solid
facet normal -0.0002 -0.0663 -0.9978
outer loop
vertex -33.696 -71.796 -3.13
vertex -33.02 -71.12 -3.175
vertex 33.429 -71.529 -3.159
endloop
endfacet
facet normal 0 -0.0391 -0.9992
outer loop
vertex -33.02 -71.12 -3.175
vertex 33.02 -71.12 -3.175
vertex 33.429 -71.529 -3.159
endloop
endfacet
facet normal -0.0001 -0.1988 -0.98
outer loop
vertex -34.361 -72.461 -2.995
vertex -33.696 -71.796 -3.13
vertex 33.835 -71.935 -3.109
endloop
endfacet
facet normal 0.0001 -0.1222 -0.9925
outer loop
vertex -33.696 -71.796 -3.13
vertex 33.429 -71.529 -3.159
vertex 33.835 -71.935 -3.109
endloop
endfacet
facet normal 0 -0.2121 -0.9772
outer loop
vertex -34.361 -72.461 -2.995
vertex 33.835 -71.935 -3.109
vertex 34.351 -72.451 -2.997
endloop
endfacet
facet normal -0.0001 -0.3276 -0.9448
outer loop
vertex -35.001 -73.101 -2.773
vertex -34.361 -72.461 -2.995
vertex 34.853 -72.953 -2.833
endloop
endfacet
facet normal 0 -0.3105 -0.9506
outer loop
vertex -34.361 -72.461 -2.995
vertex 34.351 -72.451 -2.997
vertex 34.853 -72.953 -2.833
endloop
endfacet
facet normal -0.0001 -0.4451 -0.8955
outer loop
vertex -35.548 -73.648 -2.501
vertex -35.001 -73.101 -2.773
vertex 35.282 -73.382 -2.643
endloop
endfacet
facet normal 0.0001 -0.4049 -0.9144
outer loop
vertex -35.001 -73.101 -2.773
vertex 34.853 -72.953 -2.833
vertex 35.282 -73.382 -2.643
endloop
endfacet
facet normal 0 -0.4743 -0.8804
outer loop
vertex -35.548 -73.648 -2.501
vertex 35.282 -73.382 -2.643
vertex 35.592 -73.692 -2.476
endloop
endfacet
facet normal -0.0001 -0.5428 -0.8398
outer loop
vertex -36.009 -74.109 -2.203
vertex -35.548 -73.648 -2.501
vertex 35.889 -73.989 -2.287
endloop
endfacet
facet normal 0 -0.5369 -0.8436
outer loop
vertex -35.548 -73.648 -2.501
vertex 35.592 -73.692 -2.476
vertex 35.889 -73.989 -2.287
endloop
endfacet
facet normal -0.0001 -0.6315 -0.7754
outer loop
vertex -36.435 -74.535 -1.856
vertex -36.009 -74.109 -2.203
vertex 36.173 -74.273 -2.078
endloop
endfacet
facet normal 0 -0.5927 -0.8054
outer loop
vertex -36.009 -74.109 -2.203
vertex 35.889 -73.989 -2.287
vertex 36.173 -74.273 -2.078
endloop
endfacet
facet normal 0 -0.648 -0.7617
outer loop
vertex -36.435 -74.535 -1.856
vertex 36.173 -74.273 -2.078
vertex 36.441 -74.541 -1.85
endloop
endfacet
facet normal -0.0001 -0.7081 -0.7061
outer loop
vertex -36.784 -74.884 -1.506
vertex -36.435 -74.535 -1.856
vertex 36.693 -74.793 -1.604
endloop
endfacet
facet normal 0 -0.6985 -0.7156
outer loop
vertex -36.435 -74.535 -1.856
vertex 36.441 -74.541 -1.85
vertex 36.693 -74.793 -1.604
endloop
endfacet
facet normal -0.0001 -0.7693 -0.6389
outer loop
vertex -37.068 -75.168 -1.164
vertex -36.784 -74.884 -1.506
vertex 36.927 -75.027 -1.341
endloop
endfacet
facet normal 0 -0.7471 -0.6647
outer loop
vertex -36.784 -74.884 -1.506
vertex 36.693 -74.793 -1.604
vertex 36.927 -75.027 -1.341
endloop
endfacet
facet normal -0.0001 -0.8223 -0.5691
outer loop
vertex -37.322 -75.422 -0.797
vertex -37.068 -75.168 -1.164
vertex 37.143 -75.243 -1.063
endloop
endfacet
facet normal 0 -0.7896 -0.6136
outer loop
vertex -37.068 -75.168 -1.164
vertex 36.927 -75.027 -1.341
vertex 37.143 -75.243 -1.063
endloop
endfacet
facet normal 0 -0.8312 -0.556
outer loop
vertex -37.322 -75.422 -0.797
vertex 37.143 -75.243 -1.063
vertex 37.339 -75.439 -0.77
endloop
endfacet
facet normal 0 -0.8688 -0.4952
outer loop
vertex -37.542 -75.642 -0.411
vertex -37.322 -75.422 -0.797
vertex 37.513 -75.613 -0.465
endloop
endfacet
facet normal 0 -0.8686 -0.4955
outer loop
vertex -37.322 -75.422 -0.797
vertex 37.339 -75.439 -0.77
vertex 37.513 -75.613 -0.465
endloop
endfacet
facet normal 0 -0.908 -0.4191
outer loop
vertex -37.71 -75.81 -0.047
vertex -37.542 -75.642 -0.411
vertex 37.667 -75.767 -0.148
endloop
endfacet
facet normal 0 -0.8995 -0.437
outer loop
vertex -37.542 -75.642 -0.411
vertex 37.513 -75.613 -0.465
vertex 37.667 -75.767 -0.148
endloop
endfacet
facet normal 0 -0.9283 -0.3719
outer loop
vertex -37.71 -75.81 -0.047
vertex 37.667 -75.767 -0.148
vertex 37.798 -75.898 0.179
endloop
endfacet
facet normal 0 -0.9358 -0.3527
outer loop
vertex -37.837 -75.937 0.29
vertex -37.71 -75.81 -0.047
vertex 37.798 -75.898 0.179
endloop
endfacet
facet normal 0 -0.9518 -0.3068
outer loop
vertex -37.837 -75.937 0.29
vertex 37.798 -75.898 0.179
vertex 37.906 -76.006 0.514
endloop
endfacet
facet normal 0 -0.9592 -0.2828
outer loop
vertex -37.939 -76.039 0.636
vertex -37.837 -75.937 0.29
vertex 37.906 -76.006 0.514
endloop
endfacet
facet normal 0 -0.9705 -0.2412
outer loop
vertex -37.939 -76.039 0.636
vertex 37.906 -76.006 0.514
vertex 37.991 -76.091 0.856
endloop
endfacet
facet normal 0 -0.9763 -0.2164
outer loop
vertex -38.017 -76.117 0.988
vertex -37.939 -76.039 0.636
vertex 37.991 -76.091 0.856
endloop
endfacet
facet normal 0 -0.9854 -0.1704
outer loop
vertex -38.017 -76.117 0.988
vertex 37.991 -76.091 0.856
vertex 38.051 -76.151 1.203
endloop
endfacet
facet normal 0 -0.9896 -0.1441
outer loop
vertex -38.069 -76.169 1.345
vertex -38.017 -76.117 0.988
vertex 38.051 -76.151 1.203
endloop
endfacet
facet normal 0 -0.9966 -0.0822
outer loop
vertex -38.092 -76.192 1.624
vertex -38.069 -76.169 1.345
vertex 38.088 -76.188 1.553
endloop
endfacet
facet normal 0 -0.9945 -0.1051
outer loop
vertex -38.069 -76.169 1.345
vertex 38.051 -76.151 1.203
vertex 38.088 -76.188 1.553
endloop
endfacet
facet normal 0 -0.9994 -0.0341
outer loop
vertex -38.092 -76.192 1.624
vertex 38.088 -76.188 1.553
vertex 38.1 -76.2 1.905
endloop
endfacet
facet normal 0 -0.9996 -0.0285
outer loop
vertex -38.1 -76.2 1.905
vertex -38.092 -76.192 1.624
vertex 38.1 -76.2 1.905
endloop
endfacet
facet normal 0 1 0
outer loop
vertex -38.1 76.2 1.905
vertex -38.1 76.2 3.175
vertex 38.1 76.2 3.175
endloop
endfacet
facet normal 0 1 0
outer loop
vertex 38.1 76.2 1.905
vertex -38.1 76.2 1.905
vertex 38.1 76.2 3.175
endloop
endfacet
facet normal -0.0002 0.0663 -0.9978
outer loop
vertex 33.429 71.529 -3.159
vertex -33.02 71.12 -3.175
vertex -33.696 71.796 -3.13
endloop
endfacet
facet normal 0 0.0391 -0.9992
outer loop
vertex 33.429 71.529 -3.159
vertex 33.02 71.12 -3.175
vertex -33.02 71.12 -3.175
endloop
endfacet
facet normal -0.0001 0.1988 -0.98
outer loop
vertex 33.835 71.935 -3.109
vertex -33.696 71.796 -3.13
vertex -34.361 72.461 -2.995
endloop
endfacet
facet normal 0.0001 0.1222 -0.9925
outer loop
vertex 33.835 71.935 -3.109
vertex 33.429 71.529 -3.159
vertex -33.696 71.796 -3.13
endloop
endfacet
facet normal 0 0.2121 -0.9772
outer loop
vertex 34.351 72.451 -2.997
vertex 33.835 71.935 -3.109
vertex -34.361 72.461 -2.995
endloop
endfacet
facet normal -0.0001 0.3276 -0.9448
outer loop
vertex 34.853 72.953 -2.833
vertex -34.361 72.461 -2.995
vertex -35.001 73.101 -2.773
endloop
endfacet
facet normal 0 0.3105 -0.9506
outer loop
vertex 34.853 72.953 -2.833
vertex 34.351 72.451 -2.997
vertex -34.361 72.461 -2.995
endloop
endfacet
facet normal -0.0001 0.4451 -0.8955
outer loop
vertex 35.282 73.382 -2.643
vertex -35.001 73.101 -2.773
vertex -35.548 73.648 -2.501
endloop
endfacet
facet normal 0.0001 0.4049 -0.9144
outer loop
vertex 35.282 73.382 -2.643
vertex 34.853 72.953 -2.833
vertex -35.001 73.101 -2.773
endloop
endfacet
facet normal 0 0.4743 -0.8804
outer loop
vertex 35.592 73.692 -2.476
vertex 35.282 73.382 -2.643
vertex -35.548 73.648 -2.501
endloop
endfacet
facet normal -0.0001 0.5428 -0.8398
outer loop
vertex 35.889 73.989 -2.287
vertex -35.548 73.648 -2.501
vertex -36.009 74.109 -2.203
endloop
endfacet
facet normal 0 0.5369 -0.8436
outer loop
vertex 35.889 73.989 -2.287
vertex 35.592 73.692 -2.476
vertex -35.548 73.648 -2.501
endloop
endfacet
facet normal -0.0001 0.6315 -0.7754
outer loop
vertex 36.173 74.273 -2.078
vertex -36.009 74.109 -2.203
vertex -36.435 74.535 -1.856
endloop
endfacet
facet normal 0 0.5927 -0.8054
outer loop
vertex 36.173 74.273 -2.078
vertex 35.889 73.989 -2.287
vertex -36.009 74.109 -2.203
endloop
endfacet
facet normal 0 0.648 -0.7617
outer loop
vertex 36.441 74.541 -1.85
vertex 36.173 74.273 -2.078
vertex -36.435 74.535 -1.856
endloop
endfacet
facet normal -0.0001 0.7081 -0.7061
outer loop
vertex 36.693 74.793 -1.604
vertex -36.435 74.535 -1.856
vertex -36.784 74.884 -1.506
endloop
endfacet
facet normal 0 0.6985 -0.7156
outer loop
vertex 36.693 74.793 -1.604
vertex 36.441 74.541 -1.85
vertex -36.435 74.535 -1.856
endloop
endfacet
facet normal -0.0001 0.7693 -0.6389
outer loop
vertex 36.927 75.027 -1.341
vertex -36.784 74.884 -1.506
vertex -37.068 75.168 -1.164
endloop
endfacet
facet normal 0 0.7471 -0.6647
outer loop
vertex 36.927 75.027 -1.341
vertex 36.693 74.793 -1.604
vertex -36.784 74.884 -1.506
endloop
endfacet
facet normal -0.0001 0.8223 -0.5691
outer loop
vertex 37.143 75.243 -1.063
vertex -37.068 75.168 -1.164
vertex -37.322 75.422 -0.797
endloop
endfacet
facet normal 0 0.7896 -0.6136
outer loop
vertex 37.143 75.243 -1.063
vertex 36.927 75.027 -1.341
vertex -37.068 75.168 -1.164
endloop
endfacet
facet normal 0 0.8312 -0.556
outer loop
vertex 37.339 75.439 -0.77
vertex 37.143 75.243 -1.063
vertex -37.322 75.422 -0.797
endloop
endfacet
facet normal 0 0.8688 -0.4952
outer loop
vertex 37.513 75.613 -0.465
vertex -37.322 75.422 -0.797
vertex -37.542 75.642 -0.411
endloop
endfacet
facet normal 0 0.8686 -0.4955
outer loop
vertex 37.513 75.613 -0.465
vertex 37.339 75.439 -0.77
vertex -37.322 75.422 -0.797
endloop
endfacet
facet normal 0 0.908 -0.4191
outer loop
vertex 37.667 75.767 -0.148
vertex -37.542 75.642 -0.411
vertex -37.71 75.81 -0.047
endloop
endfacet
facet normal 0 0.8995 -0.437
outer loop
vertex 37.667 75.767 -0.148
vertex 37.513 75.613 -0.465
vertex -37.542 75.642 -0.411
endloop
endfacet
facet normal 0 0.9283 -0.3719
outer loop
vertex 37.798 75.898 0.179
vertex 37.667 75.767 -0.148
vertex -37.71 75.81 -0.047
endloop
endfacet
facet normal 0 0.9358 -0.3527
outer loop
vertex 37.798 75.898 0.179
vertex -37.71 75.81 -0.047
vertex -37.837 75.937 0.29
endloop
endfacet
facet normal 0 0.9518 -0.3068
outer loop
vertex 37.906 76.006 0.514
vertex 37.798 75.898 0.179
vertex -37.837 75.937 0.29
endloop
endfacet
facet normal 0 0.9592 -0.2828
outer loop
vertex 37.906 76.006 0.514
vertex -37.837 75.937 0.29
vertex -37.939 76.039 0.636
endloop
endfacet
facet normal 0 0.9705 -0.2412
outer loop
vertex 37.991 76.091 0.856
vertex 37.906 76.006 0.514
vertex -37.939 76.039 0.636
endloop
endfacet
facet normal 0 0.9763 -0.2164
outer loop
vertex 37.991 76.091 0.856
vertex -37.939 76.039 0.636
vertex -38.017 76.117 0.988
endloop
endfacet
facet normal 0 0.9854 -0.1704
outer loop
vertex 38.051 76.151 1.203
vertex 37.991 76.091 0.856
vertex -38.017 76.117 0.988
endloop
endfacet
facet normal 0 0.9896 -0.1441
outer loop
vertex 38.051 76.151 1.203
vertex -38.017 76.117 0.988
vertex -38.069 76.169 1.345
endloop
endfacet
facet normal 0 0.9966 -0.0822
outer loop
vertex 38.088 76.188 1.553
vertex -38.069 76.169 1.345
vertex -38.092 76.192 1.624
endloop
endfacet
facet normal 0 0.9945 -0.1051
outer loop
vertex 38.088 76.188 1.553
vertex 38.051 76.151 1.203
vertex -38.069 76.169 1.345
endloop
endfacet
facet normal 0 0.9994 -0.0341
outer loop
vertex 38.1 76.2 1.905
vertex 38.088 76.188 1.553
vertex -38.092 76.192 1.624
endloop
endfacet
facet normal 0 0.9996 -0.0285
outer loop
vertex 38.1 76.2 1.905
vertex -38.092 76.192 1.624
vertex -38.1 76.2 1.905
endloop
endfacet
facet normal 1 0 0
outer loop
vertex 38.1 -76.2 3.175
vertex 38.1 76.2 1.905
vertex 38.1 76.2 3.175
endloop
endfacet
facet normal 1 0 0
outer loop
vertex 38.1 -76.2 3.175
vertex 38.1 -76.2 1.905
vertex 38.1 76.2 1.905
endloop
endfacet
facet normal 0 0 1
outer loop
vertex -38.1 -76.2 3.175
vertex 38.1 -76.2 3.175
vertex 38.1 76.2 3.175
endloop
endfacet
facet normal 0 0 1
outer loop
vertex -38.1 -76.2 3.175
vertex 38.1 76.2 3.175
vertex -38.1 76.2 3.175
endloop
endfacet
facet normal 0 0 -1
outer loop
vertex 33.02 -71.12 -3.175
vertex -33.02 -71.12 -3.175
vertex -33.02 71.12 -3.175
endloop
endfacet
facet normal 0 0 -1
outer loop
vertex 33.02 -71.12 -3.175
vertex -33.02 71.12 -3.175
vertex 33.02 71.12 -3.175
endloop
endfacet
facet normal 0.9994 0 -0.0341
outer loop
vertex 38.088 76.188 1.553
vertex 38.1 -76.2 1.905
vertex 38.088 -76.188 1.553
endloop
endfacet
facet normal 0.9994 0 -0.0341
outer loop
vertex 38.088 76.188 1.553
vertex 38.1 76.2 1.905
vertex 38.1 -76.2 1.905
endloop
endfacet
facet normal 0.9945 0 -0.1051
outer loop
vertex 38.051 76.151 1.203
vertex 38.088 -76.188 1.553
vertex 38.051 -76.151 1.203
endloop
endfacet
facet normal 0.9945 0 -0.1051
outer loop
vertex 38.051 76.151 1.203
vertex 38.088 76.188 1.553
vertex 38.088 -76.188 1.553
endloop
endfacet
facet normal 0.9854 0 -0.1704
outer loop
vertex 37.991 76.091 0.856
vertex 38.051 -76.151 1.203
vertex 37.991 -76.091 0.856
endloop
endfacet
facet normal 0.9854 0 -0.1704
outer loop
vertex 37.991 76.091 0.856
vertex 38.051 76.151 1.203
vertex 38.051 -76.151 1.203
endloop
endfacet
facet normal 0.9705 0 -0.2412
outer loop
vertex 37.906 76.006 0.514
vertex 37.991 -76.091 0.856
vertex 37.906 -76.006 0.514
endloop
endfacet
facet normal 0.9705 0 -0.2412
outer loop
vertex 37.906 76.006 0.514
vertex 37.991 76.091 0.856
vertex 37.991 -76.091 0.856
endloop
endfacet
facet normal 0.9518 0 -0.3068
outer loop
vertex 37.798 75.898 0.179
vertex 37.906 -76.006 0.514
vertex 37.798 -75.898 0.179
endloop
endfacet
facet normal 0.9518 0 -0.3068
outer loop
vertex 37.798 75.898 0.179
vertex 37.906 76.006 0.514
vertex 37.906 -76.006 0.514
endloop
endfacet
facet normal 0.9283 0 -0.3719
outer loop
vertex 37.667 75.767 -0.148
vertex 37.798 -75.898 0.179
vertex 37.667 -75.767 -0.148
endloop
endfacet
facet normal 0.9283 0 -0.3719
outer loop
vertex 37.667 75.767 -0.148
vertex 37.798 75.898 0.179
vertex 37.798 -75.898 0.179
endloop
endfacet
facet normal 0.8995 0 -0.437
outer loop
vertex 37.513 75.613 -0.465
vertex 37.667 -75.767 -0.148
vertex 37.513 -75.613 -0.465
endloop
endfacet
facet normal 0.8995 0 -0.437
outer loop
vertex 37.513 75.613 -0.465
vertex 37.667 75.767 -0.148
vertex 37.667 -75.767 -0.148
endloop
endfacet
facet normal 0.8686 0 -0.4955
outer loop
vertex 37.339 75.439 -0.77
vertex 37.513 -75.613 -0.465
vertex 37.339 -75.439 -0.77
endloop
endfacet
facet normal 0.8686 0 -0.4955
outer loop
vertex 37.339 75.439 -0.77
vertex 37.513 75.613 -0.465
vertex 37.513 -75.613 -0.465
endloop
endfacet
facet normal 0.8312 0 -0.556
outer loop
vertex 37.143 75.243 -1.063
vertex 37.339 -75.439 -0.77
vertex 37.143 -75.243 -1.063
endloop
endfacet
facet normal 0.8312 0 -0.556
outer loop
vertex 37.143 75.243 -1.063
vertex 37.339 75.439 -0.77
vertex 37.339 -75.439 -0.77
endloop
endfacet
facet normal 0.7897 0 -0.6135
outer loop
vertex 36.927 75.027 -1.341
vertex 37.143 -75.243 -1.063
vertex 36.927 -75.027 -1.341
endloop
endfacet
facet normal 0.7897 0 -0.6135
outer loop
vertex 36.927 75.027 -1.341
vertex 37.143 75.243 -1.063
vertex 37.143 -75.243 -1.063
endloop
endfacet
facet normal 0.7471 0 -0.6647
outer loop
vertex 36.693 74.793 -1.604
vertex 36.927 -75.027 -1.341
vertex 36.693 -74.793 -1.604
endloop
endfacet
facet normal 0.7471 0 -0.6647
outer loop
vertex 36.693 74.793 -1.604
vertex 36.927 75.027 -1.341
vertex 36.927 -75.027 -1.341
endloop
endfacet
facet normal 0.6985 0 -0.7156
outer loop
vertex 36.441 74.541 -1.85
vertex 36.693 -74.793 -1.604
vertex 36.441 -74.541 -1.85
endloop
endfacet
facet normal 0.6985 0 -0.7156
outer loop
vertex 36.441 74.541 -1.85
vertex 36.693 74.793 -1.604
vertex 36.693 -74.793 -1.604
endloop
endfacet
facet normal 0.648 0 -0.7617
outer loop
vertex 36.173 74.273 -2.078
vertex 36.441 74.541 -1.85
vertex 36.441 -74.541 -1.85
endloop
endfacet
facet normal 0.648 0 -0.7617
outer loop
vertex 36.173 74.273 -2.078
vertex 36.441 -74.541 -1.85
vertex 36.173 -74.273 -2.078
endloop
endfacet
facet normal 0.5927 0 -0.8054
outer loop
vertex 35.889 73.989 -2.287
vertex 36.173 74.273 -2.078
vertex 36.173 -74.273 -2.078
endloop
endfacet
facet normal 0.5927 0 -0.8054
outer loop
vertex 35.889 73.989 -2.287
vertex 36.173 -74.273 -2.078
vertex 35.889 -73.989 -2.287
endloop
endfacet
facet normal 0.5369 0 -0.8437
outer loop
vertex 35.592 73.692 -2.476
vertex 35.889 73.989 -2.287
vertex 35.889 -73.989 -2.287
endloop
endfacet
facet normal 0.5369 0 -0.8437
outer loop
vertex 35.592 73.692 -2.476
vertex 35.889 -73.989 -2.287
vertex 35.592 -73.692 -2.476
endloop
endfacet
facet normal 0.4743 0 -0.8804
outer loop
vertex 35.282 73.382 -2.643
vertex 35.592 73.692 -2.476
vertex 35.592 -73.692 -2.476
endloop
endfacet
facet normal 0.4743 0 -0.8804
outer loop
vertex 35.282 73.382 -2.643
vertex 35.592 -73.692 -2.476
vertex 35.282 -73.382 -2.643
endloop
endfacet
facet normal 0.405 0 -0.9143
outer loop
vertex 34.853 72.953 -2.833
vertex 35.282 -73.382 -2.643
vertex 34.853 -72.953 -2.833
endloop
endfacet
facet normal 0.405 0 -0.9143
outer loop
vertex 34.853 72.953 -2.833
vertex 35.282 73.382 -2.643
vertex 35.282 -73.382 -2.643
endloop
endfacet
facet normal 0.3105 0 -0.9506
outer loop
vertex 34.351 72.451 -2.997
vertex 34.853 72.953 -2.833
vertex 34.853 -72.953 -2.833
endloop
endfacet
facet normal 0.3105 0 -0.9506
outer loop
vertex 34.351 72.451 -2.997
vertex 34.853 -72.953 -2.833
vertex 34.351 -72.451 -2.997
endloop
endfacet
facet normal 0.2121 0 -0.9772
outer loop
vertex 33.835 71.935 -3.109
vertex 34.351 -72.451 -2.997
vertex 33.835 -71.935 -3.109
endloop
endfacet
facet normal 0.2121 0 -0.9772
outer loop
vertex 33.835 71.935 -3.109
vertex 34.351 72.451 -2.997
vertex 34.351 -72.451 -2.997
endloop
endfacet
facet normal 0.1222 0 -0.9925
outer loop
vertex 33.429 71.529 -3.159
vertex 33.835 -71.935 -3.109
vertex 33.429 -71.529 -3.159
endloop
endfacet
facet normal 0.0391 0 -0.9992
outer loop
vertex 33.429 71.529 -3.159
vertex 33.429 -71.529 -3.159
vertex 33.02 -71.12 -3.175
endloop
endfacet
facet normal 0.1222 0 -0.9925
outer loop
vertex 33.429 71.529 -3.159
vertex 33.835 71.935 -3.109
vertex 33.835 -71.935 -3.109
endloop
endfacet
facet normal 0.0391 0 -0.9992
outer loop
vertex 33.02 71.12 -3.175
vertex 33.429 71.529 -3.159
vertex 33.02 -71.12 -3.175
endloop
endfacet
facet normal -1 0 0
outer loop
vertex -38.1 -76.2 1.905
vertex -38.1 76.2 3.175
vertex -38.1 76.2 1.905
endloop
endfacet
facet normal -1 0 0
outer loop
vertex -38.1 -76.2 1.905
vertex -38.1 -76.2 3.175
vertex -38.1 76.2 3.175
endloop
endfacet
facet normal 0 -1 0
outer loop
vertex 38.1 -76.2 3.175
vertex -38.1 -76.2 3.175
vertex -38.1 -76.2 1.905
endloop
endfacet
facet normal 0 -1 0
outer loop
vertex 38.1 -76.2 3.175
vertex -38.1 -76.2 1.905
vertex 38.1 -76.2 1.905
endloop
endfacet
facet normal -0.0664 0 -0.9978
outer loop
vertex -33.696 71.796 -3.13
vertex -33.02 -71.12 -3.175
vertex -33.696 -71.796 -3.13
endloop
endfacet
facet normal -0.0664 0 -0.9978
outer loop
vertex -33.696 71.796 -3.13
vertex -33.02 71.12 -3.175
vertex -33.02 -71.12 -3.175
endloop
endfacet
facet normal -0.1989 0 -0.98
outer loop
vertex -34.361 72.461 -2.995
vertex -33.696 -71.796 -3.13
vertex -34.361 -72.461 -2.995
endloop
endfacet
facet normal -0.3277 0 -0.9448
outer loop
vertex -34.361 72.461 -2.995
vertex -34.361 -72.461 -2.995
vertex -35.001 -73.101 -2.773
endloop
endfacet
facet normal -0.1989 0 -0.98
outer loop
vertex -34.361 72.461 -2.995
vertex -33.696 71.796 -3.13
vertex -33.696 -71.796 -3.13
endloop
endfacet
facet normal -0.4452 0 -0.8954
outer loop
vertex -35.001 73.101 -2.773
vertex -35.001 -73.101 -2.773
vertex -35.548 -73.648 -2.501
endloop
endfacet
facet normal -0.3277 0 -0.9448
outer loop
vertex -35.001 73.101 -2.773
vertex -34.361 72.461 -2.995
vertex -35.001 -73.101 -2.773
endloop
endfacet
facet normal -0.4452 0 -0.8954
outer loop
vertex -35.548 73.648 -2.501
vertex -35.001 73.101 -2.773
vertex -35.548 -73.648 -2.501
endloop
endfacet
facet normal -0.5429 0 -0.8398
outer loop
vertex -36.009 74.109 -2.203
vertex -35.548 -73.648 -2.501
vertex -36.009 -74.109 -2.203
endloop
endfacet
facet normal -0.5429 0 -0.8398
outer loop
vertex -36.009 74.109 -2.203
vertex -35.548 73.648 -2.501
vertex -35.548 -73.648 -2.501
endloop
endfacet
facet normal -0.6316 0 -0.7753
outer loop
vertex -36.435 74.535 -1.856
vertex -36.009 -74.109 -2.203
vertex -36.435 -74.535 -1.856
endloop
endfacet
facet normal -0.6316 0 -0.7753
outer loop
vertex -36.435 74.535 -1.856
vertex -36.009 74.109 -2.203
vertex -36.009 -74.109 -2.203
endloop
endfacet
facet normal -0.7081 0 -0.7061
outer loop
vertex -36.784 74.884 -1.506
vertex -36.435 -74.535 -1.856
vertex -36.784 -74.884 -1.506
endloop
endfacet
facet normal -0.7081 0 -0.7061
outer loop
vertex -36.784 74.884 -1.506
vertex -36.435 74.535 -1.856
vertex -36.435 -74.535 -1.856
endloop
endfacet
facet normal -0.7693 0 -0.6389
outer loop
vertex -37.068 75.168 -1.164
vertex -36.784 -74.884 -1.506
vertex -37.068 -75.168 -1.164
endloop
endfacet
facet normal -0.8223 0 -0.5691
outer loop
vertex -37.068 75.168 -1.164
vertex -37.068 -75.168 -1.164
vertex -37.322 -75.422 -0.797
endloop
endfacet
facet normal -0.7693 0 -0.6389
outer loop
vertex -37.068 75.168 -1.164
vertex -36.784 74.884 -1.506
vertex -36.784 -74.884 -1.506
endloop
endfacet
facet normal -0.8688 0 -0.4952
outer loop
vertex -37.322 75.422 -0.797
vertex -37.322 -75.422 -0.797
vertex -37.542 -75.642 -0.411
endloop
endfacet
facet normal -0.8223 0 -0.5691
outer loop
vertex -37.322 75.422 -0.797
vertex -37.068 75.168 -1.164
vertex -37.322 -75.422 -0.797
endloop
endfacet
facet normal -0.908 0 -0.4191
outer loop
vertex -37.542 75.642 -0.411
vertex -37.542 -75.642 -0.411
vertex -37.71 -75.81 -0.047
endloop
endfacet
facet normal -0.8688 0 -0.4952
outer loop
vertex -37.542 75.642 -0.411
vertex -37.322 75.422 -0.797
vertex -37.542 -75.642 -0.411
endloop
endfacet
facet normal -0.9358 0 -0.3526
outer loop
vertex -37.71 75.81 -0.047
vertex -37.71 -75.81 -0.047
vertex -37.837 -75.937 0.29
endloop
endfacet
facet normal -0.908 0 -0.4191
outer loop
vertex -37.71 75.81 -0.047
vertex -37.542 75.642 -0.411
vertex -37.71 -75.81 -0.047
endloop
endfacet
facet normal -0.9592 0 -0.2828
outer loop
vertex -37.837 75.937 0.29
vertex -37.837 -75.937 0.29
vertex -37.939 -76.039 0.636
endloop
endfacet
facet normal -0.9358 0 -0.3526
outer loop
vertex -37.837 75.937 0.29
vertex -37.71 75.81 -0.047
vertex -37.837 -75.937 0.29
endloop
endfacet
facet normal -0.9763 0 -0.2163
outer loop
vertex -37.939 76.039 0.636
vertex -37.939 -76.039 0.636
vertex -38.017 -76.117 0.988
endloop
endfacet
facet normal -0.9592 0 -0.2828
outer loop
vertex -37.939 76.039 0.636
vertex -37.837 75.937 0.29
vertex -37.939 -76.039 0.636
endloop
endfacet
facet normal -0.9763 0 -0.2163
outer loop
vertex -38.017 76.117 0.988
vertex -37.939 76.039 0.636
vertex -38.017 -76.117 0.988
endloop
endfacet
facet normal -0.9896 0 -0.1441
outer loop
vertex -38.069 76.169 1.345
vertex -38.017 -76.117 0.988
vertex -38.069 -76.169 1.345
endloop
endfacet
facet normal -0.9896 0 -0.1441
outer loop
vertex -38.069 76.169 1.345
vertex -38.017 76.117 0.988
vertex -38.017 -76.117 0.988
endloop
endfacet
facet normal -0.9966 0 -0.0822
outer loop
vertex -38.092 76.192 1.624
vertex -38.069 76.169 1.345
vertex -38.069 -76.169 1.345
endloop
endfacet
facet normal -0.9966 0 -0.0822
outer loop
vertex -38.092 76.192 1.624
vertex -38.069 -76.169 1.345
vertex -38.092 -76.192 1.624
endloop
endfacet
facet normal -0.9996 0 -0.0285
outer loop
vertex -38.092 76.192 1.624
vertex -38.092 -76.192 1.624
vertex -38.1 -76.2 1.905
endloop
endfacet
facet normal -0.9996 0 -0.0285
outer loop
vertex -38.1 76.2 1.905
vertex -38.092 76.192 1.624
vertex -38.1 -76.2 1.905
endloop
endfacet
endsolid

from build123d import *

# Parameters (mm, degrees)
F1_DEPTH = 76.2
F2_DEPTH = 6.35
F3_R     = 5.08


# Not quite as in the source:
# - the program builds the solid bodies; features that only make, move or delete a surface that nothing else refers to are left out


with BuildPart() as f1:
    # F0 (on Front) → F1 (new body, symmetric)
    with BuildSketch(Plane.XZ):
        Polygon((34.29, -3.175), (38.1, -3.175), (38.1, 3.175), (-38.1, 3.175), (-38.1, -3.175), (-34.29, -3.175), align=None)
    extrude(amount=F1_DEPTH, both=True)

    # F0 (on Front) → F2 (join)
    with BuildSketch(Plane.XZ):
        Polygon((34.29, -3.175), (38.1, -3.175), (38.1, 3.175), (-38.1, 3.175), (-38.1, -3.175), (-34.29, -3.175), align=None)
    extrude(amount=F2_DEPTH)

    # F3
    f3_edges = [f1.edges().sort_by_distance(p)[0] for p in [
        (38.1, 0, -3.175),
        (0, -76.2, -3.175),
        (-38.1, 0, -3.175),
        (0, 76.2, -3.175),
    ]]
    fillet(f3_edges, radius=F3_R)


solid = f1.part
